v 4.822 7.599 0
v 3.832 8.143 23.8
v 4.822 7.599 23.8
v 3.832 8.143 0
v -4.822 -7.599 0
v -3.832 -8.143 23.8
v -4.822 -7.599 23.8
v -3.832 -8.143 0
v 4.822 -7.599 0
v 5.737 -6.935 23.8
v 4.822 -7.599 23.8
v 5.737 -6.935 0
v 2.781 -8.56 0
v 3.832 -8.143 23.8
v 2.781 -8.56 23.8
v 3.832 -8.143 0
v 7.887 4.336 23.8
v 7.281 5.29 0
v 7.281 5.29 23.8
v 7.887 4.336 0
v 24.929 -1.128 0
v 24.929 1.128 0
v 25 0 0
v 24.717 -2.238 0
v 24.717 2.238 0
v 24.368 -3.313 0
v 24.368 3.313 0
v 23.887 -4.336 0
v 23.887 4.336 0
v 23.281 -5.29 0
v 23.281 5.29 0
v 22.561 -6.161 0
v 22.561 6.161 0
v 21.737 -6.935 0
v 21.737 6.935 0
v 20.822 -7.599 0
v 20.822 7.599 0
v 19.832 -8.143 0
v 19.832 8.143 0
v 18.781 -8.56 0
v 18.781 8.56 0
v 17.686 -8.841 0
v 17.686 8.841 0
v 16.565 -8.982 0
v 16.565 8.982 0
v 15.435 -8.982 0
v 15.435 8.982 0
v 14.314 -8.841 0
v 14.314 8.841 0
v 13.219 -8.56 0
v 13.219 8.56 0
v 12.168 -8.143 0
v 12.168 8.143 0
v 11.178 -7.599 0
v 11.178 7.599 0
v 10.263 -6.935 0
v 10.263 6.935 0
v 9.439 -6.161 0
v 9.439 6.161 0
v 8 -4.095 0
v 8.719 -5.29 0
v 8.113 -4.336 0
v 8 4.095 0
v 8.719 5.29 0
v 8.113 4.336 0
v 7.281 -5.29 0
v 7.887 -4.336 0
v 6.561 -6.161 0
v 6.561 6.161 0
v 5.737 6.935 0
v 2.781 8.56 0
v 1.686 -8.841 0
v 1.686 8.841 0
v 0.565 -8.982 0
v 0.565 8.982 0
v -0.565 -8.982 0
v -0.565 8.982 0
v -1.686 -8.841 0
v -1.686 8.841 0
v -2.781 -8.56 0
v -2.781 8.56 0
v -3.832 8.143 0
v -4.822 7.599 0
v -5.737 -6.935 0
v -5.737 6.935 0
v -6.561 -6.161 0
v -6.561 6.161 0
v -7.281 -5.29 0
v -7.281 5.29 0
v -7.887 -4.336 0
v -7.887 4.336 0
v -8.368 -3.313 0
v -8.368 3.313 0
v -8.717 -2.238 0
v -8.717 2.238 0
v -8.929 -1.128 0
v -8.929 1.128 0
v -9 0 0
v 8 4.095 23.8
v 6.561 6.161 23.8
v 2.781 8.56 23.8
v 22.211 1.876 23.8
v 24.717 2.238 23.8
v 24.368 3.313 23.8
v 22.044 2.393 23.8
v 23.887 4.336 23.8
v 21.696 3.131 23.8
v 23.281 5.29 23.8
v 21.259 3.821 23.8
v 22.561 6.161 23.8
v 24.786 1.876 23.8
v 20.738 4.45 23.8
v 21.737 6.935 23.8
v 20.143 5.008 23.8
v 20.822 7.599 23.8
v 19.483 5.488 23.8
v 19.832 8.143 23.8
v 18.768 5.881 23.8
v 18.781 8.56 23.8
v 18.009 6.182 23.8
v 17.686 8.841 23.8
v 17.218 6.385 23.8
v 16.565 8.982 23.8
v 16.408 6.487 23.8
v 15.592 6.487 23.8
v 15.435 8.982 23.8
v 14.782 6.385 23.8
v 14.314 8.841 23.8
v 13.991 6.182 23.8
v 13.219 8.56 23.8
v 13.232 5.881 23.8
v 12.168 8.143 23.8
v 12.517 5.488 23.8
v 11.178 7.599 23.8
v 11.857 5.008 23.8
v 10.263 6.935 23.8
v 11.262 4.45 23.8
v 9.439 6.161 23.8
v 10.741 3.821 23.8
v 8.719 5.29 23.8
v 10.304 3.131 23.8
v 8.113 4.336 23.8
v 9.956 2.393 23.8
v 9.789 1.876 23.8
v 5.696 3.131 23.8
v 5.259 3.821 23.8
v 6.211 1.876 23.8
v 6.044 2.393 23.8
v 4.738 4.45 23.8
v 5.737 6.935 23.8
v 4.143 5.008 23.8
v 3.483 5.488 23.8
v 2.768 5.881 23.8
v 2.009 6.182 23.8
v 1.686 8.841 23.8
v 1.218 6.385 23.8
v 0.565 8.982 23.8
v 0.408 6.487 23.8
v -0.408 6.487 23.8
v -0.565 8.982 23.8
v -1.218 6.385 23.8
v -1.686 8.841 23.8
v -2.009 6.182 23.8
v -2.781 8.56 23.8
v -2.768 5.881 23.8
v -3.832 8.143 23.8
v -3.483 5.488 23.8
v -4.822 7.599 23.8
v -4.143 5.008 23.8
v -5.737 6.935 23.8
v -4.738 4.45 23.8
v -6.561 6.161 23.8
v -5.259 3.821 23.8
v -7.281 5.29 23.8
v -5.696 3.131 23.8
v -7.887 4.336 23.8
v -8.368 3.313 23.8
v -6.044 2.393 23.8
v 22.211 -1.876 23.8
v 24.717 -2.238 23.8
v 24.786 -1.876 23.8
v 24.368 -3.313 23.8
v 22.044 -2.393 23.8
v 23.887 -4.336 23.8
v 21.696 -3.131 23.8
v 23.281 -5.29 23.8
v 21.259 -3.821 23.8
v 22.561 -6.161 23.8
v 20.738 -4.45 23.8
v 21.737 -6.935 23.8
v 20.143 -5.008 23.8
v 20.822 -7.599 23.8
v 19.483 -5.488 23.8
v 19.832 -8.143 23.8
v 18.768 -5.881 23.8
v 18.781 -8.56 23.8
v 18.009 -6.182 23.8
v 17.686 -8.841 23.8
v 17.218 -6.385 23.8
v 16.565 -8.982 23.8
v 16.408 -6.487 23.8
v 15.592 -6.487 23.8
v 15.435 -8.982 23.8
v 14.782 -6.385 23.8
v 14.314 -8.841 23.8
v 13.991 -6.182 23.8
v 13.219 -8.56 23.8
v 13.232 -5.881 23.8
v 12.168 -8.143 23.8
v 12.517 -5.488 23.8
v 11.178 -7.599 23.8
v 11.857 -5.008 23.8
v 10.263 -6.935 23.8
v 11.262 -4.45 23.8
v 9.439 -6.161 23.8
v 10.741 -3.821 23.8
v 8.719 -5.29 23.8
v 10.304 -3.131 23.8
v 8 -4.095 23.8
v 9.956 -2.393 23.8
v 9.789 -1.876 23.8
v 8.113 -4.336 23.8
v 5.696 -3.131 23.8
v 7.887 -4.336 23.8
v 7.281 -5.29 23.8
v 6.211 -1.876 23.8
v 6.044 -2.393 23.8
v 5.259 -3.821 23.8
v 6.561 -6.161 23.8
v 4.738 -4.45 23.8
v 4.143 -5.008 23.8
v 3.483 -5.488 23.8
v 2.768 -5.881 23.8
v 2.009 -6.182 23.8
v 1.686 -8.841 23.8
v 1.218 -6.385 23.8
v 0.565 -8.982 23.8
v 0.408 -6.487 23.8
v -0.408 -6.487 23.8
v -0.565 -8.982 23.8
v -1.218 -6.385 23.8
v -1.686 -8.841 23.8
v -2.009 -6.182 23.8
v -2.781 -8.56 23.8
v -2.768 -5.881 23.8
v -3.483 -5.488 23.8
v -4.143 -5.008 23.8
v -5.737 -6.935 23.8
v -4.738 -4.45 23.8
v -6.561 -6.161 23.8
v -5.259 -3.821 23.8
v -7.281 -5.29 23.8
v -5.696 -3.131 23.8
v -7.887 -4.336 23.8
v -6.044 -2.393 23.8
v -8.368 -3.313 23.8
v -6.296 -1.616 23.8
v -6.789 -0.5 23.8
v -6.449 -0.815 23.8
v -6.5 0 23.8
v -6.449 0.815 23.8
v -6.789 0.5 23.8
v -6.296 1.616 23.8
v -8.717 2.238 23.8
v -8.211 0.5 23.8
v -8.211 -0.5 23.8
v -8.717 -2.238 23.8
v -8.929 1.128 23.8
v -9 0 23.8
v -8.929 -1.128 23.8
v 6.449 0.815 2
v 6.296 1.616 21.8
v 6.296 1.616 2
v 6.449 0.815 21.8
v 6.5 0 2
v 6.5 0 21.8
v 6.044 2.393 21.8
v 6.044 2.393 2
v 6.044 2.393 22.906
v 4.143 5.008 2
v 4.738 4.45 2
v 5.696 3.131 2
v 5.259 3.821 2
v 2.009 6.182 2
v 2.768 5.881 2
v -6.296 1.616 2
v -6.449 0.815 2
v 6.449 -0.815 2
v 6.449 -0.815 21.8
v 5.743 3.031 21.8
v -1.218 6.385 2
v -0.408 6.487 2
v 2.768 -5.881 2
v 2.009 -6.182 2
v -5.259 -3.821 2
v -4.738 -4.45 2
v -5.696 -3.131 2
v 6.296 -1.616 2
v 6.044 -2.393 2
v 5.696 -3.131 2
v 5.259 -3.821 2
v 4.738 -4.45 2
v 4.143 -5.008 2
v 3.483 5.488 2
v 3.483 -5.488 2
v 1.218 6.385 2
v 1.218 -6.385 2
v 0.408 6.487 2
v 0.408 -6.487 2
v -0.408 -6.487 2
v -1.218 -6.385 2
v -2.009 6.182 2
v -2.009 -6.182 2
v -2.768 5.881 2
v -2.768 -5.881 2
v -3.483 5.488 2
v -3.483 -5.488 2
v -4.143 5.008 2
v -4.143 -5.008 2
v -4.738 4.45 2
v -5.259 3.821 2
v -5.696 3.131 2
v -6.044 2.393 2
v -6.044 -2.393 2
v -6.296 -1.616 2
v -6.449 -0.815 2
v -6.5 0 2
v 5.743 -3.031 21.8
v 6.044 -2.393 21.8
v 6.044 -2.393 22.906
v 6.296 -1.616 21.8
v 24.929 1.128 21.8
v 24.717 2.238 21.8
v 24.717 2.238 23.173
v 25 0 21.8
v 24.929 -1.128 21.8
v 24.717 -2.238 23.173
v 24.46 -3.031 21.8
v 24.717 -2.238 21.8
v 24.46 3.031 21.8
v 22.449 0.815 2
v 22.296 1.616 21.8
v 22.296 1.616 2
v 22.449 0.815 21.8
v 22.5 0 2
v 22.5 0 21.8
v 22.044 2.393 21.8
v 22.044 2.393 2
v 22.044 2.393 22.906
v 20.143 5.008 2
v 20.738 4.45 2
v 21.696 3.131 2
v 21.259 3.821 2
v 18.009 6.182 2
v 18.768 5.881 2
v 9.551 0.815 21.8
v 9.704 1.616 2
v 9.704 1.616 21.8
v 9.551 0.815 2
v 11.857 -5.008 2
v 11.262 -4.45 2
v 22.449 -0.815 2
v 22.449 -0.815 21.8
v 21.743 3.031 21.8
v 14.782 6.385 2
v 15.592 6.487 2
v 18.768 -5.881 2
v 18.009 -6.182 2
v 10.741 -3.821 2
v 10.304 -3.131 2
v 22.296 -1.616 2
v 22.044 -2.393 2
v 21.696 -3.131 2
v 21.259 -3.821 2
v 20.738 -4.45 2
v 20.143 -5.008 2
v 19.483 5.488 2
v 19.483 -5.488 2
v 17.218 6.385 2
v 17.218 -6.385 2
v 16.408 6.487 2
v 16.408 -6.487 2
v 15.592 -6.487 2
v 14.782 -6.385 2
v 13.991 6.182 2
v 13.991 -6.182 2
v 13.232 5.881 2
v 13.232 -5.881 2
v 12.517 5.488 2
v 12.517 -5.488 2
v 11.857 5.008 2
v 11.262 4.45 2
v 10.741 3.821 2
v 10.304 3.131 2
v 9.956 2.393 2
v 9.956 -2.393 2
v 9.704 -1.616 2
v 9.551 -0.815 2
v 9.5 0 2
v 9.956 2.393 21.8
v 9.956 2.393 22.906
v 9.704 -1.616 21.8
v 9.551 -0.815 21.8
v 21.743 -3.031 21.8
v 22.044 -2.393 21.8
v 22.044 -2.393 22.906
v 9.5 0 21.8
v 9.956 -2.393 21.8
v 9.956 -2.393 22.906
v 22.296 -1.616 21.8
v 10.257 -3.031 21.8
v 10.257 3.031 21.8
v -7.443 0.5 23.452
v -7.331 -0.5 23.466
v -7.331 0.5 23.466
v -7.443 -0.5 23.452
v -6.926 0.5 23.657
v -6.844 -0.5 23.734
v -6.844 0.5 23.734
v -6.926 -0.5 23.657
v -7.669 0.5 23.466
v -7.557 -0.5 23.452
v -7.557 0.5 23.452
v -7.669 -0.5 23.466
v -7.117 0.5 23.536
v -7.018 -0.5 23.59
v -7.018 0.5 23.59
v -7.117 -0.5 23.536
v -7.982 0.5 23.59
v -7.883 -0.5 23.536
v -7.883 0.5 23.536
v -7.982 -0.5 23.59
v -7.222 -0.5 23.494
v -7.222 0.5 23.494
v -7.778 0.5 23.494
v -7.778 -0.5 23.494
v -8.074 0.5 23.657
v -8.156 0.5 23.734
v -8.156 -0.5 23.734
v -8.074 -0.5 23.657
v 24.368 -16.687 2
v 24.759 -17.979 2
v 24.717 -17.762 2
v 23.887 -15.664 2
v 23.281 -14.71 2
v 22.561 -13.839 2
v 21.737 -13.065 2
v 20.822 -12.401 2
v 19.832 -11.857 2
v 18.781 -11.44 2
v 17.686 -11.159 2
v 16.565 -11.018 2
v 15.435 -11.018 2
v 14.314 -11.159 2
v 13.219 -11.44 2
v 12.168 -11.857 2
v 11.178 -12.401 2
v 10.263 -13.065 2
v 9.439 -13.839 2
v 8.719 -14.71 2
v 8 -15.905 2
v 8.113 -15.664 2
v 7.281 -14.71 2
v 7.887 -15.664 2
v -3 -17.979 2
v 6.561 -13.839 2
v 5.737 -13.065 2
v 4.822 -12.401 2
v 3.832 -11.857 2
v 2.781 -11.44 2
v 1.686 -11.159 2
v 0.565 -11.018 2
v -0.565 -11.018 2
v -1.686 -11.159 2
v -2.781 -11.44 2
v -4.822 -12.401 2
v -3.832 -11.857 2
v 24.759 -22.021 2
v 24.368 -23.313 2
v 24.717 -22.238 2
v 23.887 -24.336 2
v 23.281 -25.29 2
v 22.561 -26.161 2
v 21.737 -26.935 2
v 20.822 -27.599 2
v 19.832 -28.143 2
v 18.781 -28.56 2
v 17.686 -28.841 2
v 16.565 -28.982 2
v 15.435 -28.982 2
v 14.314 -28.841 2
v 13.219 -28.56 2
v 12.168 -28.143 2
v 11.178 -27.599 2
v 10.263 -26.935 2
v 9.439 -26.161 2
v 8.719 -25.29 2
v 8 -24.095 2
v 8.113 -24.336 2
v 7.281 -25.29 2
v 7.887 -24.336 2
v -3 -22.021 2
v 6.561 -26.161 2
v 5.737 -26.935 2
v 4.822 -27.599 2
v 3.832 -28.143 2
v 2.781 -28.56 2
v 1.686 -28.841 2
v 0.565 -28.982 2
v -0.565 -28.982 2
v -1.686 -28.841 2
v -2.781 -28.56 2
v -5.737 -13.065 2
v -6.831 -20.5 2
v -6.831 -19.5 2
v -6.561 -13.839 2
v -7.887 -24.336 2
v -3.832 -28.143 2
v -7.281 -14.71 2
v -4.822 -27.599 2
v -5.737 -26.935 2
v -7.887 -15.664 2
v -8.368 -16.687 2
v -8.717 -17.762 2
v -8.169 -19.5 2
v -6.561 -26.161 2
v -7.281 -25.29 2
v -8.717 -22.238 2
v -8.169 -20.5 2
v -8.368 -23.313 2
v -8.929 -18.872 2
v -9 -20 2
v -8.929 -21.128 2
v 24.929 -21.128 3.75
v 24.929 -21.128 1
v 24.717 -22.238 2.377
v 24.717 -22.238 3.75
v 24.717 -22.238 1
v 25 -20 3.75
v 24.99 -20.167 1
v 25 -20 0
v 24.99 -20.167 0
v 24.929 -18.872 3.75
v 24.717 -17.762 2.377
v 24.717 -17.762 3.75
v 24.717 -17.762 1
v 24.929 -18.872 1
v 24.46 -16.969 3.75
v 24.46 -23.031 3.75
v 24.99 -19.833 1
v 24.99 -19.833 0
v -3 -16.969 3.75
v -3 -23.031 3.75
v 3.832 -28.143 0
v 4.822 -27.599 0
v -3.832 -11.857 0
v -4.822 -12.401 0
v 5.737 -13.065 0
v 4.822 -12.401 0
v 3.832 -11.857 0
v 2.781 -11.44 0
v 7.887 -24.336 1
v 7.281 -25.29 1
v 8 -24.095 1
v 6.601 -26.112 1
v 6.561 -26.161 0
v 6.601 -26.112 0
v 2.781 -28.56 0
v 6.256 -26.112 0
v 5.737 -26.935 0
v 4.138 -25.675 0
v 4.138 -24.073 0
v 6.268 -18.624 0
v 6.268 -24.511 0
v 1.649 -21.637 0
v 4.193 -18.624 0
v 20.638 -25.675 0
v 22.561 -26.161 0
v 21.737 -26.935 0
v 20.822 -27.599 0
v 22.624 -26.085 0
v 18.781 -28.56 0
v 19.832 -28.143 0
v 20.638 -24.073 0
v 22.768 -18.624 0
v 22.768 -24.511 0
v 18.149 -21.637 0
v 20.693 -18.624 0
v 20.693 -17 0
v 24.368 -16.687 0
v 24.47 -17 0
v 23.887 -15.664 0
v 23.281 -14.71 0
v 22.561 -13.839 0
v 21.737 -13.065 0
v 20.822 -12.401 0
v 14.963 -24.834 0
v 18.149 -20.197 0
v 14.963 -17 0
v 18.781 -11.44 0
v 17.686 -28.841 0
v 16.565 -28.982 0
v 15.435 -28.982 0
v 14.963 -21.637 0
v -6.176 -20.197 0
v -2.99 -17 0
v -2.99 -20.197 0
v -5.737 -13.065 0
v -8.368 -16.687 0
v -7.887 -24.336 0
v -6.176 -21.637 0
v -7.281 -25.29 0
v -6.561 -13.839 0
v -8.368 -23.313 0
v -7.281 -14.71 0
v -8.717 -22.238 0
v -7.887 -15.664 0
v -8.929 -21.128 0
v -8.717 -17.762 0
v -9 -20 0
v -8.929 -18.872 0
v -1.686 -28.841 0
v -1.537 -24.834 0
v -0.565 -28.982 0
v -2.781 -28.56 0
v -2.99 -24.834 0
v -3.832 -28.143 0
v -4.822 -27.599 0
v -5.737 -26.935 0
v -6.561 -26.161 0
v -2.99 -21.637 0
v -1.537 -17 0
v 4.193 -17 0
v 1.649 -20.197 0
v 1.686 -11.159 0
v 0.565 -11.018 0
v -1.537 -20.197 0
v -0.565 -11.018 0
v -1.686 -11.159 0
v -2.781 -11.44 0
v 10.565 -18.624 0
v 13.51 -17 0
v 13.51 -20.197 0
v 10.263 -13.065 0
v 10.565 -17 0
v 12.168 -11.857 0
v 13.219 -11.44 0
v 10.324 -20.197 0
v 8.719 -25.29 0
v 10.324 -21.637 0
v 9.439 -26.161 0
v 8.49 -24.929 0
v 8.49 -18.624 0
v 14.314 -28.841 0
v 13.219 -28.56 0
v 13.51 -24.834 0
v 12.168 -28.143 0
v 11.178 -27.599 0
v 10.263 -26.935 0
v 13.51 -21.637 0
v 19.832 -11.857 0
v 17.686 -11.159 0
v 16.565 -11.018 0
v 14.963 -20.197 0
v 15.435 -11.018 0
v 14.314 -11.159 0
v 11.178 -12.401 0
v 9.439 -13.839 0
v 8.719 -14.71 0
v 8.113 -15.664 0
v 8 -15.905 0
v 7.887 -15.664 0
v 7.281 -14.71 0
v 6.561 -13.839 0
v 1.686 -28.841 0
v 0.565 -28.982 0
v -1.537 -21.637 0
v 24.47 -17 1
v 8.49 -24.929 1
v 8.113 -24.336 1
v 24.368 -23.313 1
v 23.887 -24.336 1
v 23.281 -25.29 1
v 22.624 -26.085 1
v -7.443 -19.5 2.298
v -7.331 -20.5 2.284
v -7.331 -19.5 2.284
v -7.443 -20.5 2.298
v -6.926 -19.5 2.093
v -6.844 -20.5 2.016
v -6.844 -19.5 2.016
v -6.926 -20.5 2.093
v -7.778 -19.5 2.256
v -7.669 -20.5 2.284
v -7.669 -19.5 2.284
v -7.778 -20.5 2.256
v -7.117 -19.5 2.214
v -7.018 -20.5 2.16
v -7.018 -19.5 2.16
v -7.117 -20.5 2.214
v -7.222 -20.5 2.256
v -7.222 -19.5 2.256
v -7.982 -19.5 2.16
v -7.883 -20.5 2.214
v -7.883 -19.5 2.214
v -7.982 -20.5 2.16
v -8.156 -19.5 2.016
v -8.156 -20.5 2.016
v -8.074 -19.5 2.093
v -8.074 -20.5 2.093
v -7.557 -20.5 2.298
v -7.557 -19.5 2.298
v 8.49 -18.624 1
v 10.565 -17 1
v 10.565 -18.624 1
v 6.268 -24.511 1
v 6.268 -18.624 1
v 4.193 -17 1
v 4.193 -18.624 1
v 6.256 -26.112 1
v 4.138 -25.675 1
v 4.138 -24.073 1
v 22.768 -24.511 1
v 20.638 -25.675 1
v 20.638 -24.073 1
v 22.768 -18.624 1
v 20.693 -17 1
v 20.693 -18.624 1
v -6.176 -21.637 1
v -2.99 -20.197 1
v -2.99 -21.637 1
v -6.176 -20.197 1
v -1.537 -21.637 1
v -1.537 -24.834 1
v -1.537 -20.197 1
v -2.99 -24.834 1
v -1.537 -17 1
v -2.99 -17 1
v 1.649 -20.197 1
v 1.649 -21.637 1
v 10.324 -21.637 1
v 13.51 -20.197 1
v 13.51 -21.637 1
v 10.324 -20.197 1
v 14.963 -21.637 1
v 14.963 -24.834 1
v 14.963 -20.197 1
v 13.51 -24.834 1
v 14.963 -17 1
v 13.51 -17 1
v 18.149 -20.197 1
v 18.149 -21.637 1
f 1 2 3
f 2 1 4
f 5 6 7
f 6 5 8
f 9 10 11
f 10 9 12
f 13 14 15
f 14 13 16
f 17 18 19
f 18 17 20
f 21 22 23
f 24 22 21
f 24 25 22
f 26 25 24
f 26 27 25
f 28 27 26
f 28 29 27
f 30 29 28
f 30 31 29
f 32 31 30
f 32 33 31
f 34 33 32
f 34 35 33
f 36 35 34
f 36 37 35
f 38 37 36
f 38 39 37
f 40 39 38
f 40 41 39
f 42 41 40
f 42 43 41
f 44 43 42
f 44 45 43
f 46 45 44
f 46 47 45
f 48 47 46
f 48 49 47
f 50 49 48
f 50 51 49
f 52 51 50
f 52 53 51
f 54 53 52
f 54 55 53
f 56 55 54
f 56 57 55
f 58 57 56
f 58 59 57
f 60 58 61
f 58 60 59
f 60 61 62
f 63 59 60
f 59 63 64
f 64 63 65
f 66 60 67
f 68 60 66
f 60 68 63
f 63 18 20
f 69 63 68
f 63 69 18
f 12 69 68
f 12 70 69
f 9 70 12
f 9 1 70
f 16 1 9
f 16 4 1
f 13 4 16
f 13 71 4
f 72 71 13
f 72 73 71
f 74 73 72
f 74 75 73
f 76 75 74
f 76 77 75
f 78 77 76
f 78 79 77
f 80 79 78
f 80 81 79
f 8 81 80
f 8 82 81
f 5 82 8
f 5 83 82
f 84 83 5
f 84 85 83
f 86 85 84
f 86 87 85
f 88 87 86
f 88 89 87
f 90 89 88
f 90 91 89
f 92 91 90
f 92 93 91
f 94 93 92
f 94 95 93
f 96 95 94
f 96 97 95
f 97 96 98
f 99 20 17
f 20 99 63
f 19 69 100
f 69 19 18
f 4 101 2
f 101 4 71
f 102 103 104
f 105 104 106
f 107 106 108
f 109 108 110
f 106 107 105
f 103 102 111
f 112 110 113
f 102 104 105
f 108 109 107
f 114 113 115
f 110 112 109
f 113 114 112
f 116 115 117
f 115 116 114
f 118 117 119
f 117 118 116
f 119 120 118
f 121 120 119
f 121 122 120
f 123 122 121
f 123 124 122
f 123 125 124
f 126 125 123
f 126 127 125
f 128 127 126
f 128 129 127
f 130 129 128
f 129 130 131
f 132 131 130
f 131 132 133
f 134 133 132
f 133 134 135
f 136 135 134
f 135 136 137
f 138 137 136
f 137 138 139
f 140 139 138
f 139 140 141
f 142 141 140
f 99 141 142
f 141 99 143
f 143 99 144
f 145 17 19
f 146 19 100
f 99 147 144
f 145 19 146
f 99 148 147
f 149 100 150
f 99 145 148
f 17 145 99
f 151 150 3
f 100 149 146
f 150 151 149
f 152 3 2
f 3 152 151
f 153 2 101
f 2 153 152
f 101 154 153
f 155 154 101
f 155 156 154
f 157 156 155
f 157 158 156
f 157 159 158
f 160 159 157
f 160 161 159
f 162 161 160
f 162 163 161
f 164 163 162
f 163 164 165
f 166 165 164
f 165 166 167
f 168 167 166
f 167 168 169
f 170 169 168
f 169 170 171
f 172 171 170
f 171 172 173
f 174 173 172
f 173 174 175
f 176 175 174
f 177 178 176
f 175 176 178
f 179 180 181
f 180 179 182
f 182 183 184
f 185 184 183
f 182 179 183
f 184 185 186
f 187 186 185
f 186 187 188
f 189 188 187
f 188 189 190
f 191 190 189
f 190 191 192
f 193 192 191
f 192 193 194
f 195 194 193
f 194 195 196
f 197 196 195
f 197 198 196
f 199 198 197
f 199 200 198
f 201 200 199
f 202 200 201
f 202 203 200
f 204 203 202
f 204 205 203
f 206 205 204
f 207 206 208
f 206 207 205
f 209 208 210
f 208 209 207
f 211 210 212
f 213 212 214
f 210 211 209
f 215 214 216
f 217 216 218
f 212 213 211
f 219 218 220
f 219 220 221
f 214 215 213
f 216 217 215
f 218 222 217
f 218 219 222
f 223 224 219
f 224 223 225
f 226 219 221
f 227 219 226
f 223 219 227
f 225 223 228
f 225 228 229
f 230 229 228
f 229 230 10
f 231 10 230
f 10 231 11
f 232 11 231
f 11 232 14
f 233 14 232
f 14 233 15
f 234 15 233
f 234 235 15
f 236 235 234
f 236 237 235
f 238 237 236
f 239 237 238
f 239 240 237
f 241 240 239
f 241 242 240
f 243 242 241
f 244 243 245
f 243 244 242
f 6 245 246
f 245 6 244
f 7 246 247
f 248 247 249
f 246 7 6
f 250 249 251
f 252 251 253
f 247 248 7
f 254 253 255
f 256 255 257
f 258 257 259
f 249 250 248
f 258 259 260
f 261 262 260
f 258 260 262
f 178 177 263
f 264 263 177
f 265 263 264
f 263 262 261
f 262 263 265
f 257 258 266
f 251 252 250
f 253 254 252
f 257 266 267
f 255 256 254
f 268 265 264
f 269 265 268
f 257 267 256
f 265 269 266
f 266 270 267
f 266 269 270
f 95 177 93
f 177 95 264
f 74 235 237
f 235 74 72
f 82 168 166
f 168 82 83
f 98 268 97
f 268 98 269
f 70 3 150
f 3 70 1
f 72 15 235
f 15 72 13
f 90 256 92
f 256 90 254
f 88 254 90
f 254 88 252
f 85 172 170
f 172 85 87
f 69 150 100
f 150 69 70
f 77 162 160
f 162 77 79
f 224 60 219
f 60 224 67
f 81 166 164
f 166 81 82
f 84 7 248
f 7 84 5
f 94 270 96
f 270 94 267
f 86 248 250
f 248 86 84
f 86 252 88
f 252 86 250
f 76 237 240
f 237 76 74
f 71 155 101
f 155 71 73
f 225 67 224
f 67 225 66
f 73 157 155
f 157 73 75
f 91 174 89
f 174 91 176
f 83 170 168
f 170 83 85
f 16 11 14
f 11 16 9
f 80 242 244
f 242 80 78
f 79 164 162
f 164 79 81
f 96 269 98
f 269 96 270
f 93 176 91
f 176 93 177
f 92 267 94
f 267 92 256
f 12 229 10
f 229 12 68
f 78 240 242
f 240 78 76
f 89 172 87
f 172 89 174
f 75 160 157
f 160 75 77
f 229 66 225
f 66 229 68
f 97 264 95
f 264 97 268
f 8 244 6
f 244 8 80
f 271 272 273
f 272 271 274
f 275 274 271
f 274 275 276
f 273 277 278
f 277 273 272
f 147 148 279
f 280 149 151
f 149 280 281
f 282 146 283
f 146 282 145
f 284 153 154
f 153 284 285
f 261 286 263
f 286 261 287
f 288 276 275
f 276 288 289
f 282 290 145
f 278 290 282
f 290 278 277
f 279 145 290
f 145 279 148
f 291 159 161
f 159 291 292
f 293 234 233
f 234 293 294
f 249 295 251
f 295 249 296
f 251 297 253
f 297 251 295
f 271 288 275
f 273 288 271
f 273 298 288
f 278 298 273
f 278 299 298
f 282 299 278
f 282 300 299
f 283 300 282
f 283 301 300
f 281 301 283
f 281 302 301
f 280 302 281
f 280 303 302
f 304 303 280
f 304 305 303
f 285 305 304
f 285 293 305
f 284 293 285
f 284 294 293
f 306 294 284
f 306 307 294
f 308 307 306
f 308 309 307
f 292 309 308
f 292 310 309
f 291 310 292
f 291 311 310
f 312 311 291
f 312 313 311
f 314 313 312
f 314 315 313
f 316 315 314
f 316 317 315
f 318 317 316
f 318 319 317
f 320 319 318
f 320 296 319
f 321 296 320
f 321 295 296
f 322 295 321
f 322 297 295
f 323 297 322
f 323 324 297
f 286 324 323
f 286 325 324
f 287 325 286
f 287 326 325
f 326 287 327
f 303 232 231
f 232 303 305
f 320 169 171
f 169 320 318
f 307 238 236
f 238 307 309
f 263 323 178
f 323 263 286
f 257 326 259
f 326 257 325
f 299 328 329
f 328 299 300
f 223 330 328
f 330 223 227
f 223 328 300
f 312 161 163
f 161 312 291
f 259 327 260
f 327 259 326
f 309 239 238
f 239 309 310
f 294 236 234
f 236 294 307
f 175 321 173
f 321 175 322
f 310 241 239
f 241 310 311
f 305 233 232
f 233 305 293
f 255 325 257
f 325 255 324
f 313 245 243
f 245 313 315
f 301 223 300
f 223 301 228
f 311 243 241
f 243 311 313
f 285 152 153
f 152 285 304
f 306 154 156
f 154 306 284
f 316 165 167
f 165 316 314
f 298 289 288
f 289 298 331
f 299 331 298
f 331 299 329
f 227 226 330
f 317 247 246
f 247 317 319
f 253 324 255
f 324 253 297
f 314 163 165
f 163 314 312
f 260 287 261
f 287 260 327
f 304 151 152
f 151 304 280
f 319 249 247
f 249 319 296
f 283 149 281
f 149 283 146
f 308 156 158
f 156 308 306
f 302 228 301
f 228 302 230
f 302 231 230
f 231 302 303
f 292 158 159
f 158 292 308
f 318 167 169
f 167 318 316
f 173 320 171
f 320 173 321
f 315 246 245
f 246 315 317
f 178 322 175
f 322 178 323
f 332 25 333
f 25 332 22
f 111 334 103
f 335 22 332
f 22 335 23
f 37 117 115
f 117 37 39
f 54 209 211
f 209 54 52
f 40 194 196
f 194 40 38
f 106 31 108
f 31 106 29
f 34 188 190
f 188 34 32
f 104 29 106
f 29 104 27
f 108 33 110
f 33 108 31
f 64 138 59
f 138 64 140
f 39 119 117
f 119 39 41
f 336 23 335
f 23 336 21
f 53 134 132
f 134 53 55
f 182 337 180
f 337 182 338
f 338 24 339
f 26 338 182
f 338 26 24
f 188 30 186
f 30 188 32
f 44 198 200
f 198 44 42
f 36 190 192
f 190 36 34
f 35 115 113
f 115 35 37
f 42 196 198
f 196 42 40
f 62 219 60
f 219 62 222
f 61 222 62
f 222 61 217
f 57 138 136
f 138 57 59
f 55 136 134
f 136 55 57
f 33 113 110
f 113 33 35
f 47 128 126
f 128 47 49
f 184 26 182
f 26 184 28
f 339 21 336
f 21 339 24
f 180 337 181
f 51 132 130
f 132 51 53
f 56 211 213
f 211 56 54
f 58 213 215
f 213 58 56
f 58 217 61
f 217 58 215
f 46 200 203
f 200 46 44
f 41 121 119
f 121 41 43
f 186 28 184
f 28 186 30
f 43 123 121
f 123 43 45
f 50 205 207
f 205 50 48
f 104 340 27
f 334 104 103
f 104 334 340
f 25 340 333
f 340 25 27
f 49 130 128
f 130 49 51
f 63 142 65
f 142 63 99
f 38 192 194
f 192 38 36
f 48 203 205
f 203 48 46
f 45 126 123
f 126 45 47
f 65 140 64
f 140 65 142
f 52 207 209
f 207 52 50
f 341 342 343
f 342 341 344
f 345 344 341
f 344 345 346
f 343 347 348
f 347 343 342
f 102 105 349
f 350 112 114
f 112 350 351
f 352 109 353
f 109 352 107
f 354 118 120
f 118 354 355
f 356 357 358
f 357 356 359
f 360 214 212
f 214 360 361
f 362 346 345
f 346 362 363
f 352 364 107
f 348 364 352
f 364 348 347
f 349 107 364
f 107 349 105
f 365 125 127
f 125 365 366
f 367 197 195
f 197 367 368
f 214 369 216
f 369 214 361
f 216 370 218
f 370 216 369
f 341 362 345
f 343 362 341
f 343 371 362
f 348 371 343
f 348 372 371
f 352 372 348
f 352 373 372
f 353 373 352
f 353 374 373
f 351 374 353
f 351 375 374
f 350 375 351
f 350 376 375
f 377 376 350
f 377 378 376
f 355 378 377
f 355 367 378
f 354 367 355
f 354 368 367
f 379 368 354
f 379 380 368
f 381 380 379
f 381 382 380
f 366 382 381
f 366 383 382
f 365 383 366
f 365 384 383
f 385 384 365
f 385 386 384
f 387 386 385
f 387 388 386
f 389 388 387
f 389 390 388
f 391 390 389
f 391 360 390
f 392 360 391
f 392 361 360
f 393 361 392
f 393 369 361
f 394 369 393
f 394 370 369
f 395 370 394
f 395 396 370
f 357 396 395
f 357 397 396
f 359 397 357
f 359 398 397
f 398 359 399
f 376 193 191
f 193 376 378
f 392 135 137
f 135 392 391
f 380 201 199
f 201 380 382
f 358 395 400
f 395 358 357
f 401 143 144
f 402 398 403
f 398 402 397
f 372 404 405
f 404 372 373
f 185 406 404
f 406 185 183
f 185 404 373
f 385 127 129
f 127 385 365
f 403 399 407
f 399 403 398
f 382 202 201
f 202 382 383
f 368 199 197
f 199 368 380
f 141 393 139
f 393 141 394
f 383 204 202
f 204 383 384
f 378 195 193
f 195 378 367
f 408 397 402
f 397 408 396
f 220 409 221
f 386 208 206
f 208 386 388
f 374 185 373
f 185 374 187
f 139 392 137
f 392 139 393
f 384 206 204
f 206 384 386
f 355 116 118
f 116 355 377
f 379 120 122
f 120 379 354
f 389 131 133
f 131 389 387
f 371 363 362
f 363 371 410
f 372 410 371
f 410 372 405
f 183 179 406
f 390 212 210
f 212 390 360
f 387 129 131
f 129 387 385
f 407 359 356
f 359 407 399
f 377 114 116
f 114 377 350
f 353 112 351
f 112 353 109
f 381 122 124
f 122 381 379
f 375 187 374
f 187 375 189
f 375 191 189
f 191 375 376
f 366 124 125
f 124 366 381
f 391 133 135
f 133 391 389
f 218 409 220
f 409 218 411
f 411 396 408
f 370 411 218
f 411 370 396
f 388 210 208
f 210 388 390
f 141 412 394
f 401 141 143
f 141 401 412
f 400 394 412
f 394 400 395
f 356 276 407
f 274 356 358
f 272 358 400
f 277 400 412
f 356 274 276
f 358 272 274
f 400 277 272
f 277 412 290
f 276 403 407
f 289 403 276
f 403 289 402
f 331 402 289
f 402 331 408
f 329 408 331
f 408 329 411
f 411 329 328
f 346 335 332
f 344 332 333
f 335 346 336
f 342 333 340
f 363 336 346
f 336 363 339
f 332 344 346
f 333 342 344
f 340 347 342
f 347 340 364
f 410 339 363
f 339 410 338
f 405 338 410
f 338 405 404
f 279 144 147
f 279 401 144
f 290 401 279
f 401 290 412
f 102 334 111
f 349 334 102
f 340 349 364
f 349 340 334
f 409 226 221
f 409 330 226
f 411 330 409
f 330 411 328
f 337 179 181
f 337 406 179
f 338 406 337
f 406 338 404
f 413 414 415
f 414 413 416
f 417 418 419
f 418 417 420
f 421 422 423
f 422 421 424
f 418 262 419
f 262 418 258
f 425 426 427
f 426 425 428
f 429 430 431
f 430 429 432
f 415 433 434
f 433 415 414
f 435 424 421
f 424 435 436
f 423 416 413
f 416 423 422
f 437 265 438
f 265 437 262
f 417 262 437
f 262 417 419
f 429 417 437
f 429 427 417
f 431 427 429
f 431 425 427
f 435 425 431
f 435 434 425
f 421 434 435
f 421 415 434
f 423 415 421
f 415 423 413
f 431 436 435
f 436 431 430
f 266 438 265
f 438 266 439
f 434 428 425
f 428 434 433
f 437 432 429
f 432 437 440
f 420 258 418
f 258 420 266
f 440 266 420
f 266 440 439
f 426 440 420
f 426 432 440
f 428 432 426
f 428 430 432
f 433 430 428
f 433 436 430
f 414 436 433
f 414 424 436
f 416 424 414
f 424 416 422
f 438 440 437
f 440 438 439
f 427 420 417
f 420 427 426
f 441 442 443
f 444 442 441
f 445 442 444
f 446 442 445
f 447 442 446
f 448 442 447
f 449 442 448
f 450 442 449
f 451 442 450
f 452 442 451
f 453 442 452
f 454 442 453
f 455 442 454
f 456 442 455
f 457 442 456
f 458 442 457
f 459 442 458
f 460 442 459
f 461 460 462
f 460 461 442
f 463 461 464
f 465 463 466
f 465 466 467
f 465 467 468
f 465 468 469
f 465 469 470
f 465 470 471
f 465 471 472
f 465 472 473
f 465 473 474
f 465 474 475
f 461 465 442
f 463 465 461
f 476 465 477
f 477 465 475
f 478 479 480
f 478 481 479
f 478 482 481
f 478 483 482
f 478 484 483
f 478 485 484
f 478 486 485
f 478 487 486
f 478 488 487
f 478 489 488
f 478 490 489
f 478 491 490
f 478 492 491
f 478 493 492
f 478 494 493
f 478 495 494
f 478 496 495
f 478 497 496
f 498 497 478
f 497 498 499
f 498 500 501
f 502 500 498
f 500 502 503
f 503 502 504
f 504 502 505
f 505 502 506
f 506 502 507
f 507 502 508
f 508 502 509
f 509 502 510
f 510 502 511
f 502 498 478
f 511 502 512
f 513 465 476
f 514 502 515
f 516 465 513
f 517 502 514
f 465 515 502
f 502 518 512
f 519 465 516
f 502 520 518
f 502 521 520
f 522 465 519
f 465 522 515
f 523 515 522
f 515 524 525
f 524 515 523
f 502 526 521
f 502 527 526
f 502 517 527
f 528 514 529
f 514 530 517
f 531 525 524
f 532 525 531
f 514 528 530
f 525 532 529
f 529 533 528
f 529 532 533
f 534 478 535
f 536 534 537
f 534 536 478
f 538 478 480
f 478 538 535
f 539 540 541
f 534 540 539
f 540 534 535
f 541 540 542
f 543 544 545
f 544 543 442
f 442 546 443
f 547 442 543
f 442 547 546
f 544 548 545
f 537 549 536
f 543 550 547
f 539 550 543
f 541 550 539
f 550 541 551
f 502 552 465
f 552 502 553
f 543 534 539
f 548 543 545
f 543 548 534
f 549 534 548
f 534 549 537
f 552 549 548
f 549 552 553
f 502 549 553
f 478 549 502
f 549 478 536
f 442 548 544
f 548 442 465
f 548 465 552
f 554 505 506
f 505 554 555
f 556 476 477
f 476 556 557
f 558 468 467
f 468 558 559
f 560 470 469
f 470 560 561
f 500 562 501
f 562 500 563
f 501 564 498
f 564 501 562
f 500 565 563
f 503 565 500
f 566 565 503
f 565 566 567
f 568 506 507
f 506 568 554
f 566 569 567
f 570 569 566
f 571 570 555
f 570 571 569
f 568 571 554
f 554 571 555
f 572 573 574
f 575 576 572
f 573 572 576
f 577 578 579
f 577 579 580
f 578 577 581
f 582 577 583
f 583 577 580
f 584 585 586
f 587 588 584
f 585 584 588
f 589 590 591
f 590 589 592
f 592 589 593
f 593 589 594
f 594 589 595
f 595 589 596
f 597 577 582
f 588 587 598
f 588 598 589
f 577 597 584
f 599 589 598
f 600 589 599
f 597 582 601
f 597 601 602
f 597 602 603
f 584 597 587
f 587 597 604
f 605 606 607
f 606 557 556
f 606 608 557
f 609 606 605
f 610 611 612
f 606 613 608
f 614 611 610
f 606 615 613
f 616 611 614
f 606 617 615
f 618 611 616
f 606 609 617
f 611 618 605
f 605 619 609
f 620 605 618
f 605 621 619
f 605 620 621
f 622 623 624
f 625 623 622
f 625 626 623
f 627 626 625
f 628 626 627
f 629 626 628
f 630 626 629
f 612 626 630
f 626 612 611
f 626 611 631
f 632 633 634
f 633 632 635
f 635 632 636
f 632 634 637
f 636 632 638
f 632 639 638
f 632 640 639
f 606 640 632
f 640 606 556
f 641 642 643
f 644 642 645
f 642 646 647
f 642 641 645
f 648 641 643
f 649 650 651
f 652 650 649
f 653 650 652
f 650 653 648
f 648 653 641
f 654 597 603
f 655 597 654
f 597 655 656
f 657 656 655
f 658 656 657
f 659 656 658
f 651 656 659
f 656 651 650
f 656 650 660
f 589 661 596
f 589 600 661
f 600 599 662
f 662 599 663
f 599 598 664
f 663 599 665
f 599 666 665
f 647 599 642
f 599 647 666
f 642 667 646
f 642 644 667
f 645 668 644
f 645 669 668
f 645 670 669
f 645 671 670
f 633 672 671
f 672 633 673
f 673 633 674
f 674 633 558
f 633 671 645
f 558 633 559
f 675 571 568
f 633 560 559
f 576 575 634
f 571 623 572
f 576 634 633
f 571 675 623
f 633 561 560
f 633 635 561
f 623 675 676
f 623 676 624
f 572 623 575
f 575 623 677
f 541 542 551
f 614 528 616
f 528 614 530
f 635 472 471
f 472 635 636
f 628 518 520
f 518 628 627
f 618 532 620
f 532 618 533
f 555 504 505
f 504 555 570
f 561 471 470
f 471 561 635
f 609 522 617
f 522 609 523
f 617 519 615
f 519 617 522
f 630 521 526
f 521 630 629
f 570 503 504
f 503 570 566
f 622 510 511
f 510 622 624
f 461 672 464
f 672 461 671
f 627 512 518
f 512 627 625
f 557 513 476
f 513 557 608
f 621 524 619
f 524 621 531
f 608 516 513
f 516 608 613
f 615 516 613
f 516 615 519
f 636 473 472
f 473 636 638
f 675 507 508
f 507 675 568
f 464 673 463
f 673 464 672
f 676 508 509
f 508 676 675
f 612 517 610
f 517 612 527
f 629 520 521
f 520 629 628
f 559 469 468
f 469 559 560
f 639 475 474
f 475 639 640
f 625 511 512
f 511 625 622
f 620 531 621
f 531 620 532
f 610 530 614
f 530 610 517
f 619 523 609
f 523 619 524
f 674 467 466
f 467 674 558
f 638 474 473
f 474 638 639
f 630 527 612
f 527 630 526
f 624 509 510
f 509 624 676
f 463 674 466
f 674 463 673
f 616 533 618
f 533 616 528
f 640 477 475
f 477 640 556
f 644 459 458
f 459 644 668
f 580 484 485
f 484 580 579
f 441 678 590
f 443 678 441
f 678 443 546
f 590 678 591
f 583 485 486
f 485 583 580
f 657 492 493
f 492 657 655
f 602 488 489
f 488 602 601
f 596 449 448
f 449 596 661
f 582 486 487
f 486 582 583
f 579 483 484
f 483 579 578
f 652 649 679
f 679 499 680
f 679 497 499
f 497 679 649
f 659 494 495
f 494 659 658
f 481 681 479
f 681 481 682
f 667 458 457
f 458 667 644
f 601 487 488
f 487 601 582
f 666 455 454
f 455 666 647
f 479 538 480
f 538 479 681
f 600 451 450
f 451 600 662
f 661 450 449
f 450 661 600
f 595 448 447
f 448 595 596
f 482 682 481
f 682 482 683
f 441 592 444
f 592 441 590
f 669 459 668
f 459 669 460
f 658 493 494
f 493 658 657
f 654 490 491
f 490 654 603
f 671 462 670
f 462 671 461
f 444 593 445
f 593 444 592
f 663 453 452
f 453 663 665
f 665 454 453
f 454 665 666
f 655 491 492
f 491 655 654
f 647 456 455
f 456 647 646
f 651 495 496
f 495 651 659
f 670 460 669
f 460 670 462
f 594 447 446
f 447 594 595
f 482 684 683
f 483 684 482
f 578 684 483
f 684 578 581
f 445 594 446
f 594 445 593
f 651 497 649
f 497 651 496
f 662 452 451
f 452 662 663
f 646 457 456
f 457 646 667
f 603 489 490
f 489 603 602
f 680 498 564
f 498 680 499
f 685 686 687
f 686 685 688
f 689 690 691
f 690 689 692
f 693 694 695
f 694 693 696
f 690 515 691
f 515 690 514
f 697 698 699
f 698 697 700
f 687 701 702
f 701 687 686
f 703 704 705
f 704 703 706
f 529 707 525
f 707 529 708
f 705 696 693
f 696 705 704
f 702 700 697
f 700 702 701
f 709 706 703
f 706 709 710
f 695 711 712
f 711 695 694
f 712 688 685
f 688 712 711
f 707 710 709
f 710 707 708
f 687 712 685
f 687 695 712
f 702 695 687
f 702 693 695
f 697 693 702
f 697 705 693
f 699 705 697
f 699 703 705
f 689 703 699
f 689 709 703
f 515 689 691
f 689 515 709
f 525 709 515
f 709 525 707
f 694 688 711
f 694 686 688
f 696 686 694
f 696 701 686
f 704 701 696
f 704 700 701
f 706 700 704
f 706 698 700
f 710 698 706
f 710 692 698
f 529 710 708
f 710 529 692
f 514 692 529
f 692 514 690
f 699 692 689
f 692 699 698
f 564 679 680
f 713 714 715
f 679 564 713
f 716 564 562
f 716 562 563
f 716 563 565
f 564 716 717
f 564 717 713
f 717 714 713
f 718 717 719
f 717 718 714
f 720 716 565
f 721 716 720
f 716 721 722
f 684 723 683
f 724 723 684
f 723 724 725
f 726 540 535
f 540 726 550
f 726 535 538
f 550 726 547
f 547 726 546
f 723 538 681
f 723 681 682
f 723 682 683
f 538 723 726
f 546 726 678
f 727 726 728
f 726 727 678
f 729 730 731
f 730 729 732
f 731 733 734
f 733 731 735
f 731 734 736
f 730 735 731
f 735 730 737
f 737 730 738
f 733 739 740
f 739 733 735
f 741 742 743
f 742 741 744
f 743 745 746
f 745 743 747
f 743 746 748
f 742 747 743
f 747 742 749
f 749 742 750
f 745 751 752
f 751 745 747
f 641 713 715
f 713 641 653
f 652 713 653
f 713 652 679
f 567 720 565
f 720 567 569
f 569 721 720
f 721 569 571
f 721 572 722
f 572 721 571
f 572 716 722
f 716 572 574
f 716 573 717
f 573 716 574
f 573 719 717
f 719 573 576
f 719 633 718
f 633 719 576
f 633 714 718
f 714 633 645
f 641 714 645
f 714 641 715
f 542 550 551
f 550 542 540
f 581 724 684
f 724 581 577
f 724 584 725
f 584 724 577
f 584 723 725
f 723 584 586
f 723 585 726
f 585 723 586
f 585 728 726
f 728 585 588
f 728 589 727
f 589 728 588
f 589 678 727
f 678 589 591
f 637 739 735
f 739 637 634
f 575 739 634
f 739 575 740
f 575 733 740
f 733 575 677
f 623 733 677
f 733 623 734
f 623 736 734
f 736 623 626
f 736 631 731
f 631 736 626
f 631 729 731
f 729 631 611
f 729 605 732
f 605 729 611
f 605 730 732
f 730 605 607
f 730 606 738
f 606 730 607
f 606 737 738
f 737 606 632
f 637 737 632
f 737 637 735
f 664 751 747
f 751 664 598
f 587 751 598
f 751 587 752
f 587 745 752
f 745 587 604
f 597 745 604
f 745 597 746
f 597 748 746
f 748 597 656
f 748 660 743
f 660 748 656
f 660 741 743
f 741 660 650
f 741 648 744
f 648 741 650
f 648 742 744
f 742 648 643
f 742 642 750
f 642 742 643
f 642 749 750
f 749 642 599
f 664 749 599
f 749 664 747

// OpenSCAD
$fn = 50;

base = 2;
tall = 1.1*18;
toply = 2;


difference() {
    union() {
        difference() {
            cylinder(r=9, h=tall + base + toply)
                ;
            {
                translate([0, 0, base])
                cylinder(r=6.5, h=tall + toply + 0.1)
                    ;
            }
                ;
        }
            ;
        translate([16, 0, 0])
        difference() {
            cylinder(r=9, h=tall + base + toply)
                ;
            translate([0, 0, base])
            cylinder(r=6.5, h=tall + toply + 0.1)
                ;
        }
            ;
    }  
        ;
    union() {
        translate([0, 0, tall + base + 1.75])
        rotate([180, 0, 0])
        rotate([0, 90, 0])
        linear_extrude(h=15)
        circle(r=3.5, $fn=3)
            ;
        // nobble
        translate([-7.5, 0, tall + base + 1.75 + 0.8])
        rotate([90, 0, 0])
        cylinder(r=0.9, center=true)
            ;
    }
        ;
}

rotate([180, 0, 0])
translate([0, 20, 0])
difference() {
    translate([0, 0, -(tall + base + toply + 2)])
    {
        translate([0, 0, tall + base + toply])
        cylinder(r=9, h=2)
            ;
        translate([16, 0, 0])
        translate([0, 0, tall + base + toply])
        cylinder(r=9, h=2)
            ;
        // nobble
        translate([-7.5, 0, tall + base + 1.75 + 0.8 + 0.05])
        rotate([90, 0, 0])
        cylinder(r=0.9, center=true)
            ;
        intersection() {
            union() {
                cylinder(r=9, h=tall + base + toply)
                    ;
                translate([16, 0, 0])
                cylinder(r=9, h=tall + base + toply)
                    ;
            }
                ;
            translate([0, 0, 0.25])  // lil tolerance
            translate([-3, 0, 0])
            translate([0, 0, tall + base + 1.75])
            rotate([180, 0, 0])
            rotate([0, 90, 0])
            linear_extrude(h=15)
            circle(r=3.5, $fn=3)
                ;
        }
            ;
    }
        ;
    translate([0, -3, -1])
    linear_extrude(height=2)
    {
        translate([-7.5, 0, 0])
        scale(0.9)
        text("+1", font="Corbel:style=Bold")
            ;
        
        translate([9, 0, 0])
        scale(0.9)
        text("+1", font="Corbel:style=Bold")
            ;
    }
}
    ;
